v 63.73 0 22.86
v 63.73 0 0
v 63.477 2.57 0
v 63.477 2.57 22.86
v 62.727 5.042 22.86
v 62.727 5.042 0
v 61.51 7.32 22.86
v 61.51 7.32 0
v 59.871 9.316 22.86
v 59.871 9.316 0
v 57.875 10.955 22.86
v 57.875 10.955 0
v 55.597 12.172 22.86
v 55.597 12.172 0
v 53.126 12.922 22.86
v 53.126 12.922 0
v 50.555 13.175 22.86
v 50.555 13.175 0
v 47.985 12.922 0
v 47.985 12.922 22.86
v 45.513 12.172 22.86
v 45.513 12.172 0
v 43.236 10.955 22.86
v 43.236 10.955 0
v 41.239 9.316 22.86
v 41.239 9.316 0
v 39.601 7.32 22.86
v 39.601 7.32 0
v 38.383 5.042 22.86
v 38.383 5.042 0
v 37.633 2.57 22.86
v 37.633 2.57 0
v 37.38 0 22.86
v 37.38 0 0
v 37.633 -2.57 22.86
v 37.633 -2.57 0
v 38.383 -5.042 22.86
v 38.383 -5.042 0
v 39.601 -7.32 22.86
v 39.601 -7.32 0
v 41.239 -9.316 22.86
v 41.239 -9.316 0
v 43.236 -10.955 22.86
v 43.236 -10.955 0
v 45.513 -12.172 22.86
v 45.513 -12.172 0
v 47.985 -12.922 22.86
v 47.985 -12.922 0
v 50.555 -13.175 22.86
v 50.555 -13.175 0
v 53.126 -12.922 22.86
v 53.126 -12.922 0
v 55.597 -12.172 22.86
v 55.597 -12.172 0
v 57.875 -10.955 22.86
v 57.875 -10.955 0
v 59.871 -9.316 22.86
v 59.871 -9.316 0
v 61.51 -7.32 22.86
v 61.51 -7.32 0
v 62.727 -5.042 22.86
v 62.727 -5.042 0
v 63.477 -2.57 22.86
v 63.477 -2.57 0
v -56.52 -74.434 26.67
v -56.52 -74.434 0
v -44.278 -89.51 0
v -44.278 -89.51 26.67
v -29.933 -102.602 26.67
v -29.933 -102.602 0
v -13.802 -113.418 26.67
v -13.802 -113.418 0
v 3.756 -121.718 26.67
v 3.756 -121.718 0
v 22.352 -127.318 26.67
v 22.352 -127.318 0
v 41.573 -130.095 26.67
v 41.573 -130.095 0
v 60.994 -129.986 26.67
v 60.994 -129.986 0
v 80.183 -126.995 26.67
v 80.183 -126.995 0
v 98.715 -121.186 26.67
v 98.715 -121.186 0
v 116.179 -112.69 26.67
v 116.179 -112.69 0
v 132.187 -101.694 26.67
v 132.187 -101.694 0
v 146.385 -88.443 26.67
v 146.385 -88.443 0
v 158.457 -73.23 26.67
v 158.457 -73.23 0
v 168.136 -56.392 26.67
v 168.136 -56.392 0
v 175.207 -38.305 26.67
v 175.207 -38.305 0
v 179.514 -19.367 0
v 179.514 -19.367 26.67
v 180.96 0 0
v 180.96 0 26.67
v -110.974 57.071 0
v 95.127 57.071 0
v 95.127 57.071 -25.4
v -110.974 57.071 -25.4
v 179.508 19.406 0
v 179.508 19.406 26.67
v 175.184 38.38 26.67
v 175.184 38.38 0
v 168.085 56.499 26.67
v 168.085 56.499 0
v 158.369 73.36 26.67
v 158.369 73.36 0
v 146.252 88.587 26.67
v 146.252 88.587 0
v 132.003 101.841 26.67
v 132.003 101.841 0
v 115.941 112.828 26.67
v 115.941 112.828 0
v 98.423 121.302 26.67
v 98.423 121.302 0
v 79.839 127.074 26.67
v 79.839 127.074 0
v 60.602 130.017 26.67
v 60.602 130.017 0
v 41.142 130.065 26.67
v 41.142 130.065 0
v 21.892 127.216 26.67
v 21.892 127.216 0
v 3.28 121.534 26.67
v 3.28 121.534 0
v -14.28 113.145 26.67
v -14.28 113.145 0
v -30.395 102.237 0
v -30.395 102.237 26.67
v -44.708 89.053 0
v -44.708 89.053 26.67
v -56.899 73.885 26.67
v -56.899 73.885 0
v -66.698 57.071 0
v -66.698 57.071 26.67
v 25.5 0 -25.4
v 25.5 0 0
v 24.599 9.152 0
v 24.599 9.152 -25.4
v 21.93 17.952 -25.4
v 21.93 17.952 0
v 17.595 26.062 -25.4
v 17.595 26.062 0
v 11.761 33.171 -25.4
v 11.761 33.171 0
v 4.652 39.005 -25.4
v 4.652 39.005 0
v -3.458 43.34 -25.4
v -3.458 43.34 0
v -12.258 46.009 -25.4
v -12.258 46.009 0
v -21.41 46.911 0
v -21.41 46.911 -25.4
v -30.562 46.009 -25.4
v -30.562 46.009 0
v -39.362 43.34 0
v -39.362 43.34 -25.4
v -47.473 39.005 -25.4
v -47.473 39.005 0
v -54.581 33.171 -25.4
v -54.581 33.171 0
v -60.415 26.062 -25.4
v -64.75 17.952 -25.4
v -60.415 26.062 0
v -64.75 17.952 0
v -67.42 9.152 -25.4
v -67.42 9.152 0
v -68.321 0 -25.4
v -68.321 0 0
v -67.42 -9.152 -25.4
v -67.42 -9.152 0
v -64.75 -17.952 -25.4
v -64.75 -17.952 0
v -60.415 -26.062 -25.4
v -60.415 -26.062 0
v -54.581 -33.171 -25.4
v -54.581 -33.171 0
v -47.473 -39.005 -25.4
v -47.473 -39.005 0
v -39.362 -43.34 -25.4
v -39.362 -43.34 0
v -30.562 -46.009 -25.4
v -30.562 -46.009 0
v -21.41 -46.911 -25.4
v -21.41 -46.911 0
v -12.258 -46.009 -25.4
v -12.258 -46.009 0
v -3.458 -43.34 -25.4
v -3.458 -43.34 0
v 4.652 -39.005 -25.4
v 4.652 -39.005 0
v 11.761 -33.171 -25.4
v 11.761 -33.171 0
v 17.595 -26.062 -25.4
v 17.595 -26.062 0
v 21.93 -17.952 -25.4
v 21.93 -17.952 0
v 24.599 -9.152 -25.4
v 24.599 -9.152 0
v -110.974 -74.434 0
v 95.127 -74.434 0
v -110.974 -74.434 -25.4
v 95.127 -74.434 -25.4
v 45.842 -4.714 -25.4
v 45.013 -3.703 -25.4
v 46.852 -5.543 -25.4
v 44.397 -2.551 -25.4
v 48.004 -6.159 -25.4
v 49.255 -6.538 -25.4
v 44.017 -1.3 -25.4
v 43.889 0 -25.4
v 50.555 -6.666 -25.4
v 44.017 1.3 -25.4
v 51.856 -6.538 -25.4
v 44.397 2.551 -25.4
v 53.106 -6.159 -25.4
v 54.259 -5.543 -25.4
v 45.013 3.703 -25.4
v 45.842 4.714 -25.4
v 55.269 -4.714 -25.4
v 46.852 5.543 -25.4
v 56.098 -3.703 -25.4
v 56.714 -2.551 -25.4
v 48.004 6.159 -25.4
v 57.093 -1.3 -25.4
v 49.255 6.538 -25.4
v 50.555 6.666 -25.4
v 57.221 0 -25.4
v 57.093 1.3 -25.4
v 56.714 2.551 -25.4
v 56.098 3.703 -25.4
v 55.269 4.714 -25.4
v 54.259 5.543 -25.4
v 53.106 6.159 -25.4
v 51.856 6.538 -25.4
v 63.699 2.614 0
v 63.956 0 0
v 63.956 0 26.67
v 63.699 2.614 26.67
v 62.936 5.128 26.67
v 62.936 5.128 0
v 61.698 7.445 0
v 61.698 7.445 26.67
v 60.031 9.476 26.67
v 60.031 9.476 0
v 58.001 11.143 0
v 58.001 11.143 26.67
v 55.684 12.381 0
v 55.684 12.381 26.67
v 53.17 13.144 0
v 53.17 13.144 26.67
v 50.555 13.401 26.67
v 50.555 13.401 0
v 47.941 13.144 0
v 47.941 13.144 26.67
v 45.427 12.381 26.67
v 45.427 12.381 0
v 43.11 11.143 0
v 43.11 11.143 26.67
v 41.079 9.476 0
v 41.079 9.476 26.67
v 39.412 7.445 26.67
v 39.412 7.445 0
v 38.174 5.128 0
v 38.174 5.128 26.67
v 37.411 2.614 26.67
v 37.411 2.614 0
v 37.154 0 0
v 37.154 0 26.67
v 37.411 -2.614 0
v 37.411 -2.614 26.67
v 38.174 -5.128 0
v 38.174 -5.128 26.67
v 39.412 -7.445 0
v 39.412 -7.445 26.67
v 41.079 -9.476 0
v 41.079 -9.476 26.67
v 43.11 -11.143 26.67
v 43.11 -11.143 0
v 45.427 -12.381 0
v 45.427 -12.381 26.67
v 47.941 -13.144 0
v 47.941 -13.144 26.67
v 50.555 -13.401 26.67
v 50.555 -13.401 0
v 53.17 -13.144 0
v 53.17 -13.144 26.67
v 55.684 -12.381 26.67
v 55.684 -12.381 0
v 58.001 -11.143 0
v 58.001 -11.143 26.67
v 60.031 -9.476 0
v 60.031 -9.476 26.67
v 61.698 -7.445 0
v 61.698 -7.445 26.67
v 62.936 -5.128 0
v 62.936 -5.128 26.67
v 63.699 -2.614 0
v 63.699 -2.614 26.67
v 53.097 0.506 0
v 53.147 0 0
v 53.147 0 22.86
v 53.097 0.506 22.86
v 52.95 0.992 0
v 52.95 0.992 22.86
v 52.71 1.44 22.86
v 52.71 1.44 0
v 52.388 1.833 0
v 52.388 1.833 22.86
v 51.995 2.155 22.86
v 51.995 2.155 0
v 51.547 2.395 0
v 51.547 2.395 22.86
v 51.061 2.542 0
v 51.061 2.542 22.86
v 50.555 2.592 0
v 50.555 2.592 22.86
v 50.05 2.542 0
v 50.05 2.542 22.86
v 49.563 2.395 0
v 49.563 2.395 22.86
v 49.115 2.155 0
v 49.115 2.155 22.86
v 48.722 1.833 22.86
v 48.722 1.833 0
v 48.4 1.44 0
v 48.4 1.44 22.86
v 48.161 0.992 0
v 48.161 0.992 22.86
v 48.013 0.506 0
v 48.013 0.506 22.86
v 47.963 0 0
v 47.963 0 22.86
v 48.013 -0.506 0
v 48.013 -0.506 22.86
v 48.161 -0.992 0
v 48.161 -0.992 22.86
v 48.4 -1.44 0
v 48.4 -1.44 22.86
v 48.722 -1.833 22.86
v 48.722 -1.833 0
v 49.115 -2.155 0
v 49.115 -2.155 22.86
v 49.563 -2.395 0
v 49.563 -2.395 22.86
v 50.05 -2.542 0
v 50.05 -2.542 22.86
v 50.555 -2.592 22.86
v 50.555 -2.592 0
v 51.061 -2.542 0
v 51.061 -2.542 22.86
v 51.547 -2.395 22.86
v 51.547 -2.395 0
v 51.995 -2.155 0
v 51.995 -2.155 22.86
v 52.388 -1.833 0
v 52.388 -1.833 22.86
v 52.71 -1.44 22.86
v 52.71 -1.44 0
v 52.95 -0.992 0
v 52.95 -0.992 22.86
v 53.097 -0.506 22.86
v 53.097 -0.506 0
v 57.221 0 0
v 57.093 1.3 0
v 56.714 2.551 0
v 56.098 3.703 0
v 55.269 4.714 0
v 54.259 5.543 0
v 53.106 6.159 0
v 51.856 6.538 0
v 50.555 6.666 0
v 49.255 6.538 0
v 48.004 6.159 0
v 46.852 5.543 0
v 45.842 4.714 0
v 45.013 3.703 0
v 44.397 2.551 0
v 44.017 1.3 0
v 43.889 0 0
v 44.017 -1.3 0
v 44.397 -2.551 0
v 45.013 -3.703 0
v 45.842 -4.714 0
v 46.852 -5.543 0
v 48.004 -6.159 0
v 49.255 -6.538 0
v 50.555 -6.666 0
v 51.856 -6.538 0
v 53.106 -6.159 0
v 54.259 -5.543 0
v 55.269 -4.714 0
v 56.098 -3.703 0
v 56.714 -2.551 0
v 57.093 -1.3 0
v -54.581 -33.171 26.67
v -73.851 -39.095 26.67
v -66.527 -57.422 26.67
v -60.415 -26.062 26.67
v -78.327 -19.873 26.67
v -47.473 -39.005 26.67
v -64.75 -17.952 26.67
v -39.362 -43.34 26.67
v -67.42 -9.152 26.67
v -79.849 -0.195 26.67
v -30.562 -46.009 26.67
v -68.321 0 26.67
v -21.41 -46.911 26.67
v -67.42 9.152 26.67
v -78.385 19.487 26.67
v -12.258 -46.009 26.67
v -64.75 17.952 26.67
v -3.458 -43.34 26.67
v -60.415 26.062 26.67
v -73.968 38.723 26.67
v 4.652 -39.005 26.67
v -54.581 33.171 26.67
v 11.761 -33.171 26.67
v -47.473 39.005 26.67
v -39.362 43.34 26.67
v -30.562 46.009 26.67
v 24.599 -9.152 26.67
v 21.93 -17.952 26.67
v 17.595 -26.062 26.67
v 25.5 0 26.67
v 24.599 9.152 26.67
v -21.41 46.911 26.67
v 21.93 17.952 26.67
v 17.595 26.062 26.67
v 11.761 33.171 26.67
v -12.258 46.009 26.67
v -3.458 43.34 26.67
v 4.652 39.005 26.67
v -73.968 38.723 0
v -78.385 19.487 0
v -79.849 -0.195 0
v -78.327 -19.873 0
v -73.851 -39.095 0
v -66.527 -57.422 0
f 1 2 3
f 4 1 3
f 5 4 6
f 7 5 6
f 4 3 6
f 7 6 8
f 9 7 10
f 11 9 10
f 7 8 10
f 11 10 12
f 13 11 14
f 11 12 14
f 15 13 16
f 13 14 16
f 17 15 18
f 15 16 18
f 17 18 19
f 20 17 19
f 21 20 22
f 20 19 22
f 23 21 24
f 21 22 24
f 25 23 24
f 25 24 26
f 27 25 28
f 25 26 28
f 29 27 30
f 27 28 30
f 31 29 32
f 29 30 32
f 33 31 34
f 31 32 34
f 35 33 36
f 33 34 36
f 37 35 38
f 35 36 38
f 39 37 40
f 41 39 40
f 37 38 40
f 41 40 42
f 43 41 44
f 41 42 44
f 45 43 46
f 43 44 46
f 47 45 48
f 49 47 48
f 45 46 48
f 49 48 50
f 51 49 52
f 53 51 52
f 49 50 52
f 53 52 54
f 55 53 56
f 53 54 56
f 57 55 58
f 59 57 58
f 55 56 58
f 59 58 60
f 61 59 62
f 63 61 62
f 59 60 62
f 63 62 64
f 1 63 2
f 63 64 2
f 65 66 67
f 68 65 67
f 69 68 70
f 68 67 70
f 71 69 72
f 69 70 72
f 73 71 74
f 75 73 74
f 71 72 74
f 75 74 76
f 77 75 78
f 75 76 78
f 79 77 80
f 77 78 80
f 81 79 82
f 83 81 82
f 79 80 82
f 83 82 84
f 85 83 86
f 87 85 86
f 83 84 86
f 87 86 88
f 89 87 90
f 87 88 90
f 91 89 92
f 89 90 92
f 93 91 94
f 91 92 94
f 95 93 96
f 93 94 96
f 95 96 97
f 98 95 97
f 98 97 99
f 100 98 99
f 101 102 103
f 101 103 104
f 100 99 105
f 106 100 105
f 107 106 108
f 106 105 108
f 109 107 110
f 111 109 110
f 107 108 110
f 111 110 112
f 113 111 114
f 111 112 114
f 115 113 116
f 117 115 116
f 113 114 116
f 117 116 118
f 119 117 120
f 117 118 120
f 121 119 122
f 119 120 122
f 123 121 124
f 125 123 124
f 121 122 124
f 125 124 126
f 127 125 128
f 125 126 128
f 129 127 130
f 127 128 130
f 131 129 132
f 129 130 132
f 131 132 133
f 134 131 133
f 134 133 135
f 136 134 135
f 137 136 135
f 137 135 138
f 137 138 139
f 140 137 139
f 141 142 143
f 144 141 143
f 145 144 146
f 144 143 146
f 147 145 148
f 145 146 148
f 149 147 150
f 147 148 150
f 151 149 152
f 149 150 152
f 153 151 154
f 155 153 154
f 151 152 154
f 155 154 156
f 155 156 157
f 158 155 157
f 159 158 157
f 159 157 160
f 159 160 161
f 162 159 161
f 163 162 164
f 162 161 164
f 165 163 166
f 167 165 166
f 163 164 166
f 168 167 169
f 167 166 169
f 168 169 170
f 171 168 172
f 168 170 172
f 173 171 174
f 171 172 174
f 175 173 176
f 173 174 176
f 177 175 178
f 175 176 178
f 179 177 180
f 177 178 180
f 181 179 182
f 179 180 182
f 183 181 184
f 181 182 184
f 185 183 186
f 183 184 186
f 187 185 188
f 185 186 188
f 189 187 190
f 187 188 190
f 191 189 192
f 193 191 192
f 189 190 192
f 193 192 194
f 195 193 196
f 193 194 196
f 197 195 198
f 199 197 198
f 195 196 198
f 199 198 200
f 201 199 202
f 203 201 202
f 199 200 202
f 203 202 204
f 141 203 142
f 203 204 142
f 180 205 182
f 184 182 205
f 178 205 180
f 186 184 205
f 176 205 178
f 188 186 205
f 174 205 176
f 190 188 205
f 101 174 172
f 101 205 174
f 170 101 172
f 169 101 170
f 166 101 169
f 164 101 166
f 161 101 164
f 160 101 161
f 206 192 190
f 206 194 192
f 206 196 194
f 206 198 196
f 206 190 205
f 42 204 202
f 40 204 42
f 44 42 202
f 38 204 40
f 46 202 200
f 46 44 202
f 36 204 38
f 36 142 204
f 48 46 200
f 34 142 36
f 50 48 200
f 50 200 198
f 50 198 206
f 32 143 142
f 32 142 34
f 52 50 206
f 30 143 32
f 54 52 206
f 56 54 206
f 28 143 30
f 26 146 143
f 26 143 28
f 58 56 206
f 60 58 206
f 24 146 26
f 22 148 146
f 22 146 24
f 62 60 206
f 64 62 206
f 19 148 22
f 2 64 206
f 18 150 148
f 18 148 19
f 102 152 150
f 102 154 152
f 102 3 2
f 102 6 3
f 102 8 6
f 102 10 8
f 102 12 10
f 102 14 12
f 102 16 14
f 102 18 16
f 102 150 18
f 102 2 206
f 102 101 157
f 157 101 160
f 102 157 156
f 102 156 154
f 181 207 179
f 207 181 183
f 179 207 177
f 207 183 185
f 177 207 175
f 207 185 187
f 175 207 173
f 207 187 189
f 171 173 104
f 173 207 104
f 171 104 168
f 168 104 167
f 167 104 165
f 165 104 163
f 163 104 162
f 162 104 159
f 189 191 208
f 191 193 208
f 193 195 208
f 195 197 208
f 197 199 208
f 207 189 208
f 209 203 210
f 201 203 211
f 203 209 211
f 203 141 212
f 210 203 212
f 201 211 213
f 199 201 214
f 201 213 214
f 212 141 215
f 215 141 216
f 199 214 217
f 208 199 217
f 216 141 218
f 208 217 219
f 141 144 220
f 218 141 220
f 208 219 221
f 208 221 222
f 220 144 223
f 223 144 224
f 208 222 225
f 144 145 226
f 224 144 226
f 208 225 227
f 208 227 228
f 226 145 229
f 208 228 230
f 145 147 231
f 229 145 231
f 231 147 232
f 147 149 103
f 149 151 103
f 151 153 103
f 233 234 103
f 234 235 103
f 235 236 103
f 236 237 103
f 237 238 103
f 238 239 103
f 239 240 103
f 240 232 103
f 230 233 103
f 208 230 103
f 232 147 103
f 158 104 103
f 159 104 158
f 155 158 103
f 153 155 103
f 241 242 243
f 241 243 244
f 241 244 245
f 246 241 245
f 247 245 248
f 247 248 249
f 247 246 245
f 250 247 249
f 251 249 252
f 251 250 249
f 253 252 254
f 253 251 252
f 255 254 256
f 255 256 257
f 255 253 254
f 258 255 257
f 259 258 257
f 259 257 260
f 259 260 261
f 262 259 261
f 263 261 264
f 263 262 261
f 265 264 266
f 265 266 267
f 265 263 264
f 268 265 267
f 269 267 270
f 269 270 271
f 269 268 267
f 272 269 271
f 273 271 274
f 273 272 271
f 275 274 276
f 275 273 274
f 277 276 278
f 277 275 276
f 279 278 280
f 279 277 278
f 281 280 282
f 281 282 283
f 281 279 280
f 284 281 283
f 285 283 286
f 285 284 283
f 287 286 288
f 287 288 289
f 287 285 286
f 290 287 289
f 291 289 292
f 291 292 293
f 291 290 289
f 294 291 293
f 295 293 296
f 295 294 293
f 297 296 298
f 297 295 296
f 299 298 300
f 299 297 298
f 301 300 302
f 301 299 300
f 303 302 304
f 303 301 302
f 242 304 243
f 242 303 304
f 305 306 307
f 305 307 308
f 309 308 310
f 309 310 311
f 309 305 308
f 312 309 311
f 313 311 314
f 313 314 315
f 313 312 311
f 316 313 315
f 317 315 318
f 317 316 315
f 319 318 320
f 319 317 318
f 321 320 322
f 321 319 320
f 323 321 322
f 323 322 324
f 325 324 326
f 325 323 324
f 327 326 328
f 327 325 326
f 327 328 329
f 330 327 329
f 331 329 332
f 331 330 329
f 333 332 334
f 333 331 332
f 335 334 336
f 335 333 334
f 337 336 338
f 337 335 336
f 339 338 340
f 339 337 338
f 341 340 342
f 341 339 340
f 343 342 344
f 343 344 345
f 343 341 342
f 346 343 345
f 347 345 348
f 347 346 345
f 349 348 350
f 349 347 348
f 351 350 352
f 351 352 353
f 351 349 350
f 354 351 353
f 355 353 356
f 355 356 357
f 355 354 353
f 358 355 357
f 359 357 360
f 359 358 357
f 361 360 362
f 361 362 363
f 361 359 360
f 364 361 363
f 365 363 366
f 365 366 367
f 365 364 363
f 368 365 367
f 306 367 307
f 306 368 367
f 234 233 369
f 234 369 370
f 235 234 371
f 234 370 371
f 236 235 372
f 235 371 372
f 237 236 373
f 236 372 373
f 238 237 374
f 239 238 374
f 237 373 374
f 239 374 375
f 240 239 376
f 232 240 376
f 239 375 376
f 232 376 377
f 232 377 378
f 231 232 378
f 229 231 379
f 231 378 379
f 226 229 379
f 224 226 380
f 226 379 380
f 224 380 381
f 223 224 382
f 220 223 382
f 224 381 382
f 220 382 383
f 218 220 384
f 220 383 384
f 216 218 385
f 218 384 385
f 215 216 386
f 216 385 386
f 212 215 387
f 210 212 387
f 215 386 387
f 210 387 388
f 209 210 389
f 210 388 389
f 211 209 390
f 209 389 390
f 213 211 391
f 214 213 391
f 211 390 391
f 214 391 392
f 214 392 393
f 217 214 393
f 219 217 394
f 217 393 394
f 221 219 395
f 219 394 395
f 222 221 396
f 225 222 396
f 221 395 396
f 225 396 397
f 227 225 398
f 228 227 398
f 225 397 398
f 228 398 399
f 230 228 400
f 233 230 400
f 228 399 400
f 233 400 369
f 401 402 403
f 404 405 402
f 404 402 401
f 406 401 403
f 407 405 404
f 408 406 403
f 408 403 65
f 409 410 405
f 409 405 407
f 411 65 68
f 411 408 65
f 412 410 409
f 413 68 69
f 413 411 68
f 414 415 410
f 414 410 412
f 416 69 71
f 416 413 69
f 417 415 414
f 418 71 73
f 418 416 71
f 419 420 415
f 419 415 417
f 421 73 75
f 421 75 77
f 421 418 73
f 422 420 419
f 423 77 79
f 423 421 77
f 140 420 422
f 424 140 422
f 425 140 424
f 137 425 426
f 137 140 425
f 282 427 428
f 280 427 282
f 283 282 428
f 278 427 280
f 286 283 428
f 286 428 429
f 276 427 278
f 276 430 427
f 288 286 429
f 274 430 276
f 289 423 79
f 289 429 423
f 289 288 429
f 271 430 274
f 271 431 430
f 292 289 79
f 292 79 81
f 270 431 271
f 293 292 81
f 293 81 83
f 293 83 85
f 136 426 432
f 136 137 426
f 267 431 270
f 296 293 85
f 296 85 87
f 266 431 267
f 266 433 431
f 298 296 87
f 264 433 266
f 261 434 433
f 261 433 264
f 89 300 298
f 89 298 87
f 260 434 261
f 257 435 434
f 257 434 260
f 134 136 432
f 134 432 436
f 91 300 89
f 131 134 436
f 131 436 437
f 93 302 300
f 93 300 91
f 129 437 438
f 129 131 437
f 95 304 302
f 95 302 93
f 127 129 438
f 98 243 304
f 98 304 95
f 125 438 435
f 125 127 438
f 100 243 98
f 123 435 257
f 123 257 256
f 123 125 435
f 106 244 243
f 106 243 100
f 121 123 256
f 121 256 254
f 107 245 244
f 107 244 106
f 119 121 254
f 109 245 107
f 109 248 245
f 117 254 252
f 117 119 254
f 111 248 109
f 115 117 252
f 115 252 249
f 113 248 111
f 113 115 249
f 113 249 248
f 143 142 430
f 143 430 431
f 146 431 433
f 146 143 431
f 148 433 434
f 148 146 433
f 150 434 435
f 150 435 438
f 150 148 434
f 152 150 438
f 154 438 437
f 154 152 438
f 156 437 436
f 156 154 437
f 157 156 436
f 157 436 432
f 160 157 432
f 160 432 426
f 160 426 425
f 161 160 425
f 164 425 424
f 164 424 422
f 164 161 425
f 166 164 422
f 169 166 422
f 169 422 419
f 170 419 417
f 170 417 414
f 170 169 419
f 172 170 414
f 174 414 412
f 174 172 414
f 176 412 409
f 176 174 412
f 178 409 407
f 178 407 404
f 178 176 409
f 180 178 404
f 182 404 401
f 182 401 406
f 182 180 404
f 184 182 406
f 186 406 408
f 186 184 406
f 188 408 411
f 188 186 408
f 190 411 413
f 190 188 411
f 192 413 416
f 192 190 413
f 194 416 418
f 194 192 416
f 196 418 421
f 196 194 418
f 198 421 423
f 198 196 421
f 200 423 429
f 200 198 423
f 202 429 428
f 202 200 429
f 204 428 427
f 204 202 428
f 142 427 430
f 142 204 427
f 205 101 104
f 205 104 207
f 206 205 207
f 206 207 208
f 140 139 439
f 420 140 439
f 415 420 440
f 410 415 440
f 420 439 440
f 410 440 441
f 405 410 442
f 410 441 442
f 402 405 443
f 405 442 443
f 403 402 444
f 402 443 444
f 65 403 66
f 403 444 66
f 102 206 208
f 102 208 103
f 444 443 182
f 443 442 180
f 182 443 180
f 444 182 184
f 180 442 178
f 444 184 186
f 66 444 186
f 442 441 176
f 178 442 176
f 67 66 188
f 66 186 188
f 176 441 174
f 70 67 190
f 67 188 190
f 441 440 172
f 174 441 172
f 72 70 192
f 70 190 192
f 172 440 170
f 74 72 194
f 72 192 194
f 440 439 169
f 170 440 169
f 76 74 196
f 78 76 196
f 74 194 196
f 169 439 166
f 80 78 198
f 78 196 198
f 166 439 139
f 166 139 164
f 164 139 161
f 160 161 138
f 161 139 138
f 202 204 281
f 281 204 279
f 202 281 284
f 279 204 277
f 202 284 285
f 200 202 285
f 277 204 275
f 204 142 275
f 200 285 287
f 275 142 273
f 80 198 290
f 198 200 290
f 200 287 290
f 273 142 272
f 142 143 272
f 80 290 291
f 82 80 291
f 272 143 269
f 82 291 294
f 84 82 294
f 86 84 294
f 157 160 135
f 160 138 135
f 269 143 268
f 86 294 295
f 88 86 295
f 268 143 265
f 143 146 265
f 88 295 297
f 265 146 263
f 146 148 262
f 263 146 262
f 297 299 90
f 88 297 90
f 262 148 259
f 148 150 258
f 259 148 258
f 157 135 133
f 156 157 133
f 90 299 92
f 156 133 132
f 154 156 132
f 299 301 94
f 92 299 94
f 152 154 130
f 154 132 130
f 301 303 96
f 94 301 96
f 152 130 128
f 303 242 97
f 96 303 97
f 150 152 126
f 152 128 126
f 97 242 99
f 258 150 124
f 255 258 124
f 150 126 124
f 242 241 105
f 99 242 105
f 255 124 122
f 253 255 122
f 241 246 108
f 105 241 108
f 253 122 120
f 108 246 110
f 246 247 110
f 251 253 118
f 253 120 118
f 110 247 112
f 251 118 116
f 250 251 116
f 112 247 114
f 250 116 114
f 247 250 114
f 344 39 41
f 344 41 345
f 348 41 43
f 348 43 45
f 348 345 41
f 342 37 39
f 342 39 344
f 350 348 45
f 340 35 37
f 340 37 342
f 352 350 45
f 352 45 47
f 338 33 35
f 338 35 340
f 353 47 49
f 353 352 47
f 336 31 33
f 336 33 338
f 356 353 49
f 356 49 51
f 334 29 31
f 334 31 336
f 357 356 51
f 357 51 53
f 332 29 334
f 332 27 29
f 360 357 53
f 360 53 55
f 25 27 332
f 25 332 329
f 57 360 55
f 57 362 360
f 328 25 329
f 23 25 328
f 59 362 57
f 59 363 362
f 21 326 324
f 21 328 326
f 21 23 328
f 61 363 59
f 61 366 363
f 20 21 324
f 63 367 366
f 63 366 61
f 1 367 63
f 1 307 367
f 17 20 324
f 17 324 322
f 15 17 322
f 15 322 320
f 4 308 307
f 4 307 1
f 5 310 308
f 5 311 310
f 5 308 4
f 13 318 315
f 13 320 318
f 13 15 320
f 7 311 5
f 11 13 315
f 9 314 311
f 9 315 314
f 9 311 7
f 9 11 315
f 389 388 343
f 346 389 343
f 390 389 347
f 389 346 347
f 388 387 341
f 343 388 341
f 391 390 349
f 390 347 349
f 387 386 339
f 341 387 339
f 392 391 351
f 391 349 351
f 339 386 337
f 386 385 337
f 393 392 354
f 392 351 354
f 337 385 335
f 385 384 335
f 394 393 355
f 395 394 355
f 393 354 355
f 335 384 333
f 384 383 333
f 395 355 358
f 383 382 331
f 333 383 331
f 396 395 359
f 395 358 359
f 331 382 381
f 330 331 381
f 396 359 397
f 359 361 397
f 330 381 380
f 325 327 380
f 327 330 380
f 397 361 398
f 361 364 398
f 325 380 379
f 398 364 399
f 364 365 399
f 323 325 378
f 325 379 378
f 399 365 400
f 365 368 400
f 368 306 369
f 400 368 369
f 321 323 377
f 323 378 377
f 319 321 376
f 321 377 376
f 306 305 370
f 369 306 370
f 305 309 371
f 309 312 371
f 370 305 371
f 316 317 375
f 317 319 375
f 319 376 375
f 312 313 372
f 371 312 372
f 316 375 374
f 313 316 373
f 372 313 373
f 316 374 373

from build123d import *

# Parameters (mm, degrees)
F0_R     = 46.9107423569
F0_R_2   = 13.401249698
F1_DEPTH = 26.67
F0_R_3   = 13.1750226466
F0_R_4   = 6.6660151199
F2_DEPTH = 25.4
F0_R_5   = 2.5920243027
F3_DEPTH = 22.86


with BuildPart() as f1:
    # F0 (on Top) → F1 (new body)
    with BuildSketch(Plane.XY):
        with BuildLine():
            ThreePointArc((180.9600731002, 0), (79.8387593607, 127.0743864177), (-66.6978861635, 57.0713058114))
            Line((-66.6978861635, 57.0713058114), (95.1269119978, 57.0713058114))
            Line((95.1269119978, 57.0713058114), (95.1269119978, -74.433542788))
            Line((95.1269119978, -74.433542788), (-56.5198592453, -74.433542788))
            ThreePointArc((-56.5198592453, -74.433542788), (89.5572424471, -124.4357972599), (180.9600731002, 0))
        make_face()
        with BuildLine():
            Line((95.1269119978, 57.0713058114), (-66.6978861635, 57.0713058114))
            ThreePointArc((-66.6978861635, 57.0713058114), (-79.4607979805, -10.0627966389), (-56.5198592453, -74.433542788))
            Line((-56.5198592453, -74.433542788), (95.1269119978, -74.433542788))
            Line((95.1269119978, -74.433542788), (95.1269119978, 57.0713058114))
        make_face()
        with Locations((-21.4103162289, 0)):
            Circle(F0_R, mode=Mode.SUBTRACT)
        with Locations((50.5552217364, 0)):
            Circle(F0_R_2, mode=Mode.SUBTRACT)
    extrude(amount=F1_DEPTH)


with BuildPart() as f2:
    # F0 (on Top) → F2 (new body)
    with BuildSketch(Plane.XY):
        with BuildLine():
            Line((-66.6978861635, 57.0713058114), (-110.9738275409, 57.0713058114))
            Line((-110.9738275409, 57.0713058114), (-110.9738275409, -74.433542788))
            Line((-110.9738275409, -74.433542788), (-56.5198592453, -74.433542788))
            ThreePointArc((-56.5198592453, -74.433542788), (-79.4607979805, -10.0627966389), (-66.6978861635, 57.0713058114))
        make_face()
        with BuildLine():
            Line((95.1269119978, 57.0713058114), (-66.6978861635, 57.0713058114))
            ThreePointArc((-66.6978861635, 57.0713058114), (-79.4607979805, -10.0627966389), (-56.5198592453, -74.433542788))
            Line((-56.5198592453, -74.433542788), (95.1269119978, -74.433542788))
            Line((95.1269119978, -74.433542788), (95.1269119978, 57.0713058114))
        make_face()
        with Locations((-21.4103162289, 0)):
            Circle(F0_R, mode=Mode.SUBTRACT)
        with Locations((50.5552217364, 0)):
            Circle(F0_R_2, mode=Mode.SUBTRACT)
        with Locations((50.5552217364, 0)):
            Circle(F0_R_2)
        with Locations((50.5552217364, 0)):
            Circle(F0_R_3, mode=Mode.SUBTRACT)
        with Locations((50.5552217364, 0)):
            Circle(F0_R_3)
        with Locations((50.5552217364, 0)):
            Circle(F0_R_4, mode=Mode.SUBTRACT)
    extrude(amount=-F2_DEPTH)

    # F0 (on Top) → F3 (join)
    with BuildSketch(Plane.XY):
        with Locations((50.5552217364, 0)):
            Circle(F0_R_3)
        with Locations((50.5552217364, 0)):
            Circle(F0_R_4, mode=Mode.SUBTRACT)
        with Locations((50.5552217364, 0)):
            Circle(F0_R_4)
        with Locations((50.5552217364, 0)):
            Circle(F0_R_5, mode=Mode.SUBTRACT)
    extrude(amount=F3_DEPTH)


solid = Compound([f1.part, f2.part])
